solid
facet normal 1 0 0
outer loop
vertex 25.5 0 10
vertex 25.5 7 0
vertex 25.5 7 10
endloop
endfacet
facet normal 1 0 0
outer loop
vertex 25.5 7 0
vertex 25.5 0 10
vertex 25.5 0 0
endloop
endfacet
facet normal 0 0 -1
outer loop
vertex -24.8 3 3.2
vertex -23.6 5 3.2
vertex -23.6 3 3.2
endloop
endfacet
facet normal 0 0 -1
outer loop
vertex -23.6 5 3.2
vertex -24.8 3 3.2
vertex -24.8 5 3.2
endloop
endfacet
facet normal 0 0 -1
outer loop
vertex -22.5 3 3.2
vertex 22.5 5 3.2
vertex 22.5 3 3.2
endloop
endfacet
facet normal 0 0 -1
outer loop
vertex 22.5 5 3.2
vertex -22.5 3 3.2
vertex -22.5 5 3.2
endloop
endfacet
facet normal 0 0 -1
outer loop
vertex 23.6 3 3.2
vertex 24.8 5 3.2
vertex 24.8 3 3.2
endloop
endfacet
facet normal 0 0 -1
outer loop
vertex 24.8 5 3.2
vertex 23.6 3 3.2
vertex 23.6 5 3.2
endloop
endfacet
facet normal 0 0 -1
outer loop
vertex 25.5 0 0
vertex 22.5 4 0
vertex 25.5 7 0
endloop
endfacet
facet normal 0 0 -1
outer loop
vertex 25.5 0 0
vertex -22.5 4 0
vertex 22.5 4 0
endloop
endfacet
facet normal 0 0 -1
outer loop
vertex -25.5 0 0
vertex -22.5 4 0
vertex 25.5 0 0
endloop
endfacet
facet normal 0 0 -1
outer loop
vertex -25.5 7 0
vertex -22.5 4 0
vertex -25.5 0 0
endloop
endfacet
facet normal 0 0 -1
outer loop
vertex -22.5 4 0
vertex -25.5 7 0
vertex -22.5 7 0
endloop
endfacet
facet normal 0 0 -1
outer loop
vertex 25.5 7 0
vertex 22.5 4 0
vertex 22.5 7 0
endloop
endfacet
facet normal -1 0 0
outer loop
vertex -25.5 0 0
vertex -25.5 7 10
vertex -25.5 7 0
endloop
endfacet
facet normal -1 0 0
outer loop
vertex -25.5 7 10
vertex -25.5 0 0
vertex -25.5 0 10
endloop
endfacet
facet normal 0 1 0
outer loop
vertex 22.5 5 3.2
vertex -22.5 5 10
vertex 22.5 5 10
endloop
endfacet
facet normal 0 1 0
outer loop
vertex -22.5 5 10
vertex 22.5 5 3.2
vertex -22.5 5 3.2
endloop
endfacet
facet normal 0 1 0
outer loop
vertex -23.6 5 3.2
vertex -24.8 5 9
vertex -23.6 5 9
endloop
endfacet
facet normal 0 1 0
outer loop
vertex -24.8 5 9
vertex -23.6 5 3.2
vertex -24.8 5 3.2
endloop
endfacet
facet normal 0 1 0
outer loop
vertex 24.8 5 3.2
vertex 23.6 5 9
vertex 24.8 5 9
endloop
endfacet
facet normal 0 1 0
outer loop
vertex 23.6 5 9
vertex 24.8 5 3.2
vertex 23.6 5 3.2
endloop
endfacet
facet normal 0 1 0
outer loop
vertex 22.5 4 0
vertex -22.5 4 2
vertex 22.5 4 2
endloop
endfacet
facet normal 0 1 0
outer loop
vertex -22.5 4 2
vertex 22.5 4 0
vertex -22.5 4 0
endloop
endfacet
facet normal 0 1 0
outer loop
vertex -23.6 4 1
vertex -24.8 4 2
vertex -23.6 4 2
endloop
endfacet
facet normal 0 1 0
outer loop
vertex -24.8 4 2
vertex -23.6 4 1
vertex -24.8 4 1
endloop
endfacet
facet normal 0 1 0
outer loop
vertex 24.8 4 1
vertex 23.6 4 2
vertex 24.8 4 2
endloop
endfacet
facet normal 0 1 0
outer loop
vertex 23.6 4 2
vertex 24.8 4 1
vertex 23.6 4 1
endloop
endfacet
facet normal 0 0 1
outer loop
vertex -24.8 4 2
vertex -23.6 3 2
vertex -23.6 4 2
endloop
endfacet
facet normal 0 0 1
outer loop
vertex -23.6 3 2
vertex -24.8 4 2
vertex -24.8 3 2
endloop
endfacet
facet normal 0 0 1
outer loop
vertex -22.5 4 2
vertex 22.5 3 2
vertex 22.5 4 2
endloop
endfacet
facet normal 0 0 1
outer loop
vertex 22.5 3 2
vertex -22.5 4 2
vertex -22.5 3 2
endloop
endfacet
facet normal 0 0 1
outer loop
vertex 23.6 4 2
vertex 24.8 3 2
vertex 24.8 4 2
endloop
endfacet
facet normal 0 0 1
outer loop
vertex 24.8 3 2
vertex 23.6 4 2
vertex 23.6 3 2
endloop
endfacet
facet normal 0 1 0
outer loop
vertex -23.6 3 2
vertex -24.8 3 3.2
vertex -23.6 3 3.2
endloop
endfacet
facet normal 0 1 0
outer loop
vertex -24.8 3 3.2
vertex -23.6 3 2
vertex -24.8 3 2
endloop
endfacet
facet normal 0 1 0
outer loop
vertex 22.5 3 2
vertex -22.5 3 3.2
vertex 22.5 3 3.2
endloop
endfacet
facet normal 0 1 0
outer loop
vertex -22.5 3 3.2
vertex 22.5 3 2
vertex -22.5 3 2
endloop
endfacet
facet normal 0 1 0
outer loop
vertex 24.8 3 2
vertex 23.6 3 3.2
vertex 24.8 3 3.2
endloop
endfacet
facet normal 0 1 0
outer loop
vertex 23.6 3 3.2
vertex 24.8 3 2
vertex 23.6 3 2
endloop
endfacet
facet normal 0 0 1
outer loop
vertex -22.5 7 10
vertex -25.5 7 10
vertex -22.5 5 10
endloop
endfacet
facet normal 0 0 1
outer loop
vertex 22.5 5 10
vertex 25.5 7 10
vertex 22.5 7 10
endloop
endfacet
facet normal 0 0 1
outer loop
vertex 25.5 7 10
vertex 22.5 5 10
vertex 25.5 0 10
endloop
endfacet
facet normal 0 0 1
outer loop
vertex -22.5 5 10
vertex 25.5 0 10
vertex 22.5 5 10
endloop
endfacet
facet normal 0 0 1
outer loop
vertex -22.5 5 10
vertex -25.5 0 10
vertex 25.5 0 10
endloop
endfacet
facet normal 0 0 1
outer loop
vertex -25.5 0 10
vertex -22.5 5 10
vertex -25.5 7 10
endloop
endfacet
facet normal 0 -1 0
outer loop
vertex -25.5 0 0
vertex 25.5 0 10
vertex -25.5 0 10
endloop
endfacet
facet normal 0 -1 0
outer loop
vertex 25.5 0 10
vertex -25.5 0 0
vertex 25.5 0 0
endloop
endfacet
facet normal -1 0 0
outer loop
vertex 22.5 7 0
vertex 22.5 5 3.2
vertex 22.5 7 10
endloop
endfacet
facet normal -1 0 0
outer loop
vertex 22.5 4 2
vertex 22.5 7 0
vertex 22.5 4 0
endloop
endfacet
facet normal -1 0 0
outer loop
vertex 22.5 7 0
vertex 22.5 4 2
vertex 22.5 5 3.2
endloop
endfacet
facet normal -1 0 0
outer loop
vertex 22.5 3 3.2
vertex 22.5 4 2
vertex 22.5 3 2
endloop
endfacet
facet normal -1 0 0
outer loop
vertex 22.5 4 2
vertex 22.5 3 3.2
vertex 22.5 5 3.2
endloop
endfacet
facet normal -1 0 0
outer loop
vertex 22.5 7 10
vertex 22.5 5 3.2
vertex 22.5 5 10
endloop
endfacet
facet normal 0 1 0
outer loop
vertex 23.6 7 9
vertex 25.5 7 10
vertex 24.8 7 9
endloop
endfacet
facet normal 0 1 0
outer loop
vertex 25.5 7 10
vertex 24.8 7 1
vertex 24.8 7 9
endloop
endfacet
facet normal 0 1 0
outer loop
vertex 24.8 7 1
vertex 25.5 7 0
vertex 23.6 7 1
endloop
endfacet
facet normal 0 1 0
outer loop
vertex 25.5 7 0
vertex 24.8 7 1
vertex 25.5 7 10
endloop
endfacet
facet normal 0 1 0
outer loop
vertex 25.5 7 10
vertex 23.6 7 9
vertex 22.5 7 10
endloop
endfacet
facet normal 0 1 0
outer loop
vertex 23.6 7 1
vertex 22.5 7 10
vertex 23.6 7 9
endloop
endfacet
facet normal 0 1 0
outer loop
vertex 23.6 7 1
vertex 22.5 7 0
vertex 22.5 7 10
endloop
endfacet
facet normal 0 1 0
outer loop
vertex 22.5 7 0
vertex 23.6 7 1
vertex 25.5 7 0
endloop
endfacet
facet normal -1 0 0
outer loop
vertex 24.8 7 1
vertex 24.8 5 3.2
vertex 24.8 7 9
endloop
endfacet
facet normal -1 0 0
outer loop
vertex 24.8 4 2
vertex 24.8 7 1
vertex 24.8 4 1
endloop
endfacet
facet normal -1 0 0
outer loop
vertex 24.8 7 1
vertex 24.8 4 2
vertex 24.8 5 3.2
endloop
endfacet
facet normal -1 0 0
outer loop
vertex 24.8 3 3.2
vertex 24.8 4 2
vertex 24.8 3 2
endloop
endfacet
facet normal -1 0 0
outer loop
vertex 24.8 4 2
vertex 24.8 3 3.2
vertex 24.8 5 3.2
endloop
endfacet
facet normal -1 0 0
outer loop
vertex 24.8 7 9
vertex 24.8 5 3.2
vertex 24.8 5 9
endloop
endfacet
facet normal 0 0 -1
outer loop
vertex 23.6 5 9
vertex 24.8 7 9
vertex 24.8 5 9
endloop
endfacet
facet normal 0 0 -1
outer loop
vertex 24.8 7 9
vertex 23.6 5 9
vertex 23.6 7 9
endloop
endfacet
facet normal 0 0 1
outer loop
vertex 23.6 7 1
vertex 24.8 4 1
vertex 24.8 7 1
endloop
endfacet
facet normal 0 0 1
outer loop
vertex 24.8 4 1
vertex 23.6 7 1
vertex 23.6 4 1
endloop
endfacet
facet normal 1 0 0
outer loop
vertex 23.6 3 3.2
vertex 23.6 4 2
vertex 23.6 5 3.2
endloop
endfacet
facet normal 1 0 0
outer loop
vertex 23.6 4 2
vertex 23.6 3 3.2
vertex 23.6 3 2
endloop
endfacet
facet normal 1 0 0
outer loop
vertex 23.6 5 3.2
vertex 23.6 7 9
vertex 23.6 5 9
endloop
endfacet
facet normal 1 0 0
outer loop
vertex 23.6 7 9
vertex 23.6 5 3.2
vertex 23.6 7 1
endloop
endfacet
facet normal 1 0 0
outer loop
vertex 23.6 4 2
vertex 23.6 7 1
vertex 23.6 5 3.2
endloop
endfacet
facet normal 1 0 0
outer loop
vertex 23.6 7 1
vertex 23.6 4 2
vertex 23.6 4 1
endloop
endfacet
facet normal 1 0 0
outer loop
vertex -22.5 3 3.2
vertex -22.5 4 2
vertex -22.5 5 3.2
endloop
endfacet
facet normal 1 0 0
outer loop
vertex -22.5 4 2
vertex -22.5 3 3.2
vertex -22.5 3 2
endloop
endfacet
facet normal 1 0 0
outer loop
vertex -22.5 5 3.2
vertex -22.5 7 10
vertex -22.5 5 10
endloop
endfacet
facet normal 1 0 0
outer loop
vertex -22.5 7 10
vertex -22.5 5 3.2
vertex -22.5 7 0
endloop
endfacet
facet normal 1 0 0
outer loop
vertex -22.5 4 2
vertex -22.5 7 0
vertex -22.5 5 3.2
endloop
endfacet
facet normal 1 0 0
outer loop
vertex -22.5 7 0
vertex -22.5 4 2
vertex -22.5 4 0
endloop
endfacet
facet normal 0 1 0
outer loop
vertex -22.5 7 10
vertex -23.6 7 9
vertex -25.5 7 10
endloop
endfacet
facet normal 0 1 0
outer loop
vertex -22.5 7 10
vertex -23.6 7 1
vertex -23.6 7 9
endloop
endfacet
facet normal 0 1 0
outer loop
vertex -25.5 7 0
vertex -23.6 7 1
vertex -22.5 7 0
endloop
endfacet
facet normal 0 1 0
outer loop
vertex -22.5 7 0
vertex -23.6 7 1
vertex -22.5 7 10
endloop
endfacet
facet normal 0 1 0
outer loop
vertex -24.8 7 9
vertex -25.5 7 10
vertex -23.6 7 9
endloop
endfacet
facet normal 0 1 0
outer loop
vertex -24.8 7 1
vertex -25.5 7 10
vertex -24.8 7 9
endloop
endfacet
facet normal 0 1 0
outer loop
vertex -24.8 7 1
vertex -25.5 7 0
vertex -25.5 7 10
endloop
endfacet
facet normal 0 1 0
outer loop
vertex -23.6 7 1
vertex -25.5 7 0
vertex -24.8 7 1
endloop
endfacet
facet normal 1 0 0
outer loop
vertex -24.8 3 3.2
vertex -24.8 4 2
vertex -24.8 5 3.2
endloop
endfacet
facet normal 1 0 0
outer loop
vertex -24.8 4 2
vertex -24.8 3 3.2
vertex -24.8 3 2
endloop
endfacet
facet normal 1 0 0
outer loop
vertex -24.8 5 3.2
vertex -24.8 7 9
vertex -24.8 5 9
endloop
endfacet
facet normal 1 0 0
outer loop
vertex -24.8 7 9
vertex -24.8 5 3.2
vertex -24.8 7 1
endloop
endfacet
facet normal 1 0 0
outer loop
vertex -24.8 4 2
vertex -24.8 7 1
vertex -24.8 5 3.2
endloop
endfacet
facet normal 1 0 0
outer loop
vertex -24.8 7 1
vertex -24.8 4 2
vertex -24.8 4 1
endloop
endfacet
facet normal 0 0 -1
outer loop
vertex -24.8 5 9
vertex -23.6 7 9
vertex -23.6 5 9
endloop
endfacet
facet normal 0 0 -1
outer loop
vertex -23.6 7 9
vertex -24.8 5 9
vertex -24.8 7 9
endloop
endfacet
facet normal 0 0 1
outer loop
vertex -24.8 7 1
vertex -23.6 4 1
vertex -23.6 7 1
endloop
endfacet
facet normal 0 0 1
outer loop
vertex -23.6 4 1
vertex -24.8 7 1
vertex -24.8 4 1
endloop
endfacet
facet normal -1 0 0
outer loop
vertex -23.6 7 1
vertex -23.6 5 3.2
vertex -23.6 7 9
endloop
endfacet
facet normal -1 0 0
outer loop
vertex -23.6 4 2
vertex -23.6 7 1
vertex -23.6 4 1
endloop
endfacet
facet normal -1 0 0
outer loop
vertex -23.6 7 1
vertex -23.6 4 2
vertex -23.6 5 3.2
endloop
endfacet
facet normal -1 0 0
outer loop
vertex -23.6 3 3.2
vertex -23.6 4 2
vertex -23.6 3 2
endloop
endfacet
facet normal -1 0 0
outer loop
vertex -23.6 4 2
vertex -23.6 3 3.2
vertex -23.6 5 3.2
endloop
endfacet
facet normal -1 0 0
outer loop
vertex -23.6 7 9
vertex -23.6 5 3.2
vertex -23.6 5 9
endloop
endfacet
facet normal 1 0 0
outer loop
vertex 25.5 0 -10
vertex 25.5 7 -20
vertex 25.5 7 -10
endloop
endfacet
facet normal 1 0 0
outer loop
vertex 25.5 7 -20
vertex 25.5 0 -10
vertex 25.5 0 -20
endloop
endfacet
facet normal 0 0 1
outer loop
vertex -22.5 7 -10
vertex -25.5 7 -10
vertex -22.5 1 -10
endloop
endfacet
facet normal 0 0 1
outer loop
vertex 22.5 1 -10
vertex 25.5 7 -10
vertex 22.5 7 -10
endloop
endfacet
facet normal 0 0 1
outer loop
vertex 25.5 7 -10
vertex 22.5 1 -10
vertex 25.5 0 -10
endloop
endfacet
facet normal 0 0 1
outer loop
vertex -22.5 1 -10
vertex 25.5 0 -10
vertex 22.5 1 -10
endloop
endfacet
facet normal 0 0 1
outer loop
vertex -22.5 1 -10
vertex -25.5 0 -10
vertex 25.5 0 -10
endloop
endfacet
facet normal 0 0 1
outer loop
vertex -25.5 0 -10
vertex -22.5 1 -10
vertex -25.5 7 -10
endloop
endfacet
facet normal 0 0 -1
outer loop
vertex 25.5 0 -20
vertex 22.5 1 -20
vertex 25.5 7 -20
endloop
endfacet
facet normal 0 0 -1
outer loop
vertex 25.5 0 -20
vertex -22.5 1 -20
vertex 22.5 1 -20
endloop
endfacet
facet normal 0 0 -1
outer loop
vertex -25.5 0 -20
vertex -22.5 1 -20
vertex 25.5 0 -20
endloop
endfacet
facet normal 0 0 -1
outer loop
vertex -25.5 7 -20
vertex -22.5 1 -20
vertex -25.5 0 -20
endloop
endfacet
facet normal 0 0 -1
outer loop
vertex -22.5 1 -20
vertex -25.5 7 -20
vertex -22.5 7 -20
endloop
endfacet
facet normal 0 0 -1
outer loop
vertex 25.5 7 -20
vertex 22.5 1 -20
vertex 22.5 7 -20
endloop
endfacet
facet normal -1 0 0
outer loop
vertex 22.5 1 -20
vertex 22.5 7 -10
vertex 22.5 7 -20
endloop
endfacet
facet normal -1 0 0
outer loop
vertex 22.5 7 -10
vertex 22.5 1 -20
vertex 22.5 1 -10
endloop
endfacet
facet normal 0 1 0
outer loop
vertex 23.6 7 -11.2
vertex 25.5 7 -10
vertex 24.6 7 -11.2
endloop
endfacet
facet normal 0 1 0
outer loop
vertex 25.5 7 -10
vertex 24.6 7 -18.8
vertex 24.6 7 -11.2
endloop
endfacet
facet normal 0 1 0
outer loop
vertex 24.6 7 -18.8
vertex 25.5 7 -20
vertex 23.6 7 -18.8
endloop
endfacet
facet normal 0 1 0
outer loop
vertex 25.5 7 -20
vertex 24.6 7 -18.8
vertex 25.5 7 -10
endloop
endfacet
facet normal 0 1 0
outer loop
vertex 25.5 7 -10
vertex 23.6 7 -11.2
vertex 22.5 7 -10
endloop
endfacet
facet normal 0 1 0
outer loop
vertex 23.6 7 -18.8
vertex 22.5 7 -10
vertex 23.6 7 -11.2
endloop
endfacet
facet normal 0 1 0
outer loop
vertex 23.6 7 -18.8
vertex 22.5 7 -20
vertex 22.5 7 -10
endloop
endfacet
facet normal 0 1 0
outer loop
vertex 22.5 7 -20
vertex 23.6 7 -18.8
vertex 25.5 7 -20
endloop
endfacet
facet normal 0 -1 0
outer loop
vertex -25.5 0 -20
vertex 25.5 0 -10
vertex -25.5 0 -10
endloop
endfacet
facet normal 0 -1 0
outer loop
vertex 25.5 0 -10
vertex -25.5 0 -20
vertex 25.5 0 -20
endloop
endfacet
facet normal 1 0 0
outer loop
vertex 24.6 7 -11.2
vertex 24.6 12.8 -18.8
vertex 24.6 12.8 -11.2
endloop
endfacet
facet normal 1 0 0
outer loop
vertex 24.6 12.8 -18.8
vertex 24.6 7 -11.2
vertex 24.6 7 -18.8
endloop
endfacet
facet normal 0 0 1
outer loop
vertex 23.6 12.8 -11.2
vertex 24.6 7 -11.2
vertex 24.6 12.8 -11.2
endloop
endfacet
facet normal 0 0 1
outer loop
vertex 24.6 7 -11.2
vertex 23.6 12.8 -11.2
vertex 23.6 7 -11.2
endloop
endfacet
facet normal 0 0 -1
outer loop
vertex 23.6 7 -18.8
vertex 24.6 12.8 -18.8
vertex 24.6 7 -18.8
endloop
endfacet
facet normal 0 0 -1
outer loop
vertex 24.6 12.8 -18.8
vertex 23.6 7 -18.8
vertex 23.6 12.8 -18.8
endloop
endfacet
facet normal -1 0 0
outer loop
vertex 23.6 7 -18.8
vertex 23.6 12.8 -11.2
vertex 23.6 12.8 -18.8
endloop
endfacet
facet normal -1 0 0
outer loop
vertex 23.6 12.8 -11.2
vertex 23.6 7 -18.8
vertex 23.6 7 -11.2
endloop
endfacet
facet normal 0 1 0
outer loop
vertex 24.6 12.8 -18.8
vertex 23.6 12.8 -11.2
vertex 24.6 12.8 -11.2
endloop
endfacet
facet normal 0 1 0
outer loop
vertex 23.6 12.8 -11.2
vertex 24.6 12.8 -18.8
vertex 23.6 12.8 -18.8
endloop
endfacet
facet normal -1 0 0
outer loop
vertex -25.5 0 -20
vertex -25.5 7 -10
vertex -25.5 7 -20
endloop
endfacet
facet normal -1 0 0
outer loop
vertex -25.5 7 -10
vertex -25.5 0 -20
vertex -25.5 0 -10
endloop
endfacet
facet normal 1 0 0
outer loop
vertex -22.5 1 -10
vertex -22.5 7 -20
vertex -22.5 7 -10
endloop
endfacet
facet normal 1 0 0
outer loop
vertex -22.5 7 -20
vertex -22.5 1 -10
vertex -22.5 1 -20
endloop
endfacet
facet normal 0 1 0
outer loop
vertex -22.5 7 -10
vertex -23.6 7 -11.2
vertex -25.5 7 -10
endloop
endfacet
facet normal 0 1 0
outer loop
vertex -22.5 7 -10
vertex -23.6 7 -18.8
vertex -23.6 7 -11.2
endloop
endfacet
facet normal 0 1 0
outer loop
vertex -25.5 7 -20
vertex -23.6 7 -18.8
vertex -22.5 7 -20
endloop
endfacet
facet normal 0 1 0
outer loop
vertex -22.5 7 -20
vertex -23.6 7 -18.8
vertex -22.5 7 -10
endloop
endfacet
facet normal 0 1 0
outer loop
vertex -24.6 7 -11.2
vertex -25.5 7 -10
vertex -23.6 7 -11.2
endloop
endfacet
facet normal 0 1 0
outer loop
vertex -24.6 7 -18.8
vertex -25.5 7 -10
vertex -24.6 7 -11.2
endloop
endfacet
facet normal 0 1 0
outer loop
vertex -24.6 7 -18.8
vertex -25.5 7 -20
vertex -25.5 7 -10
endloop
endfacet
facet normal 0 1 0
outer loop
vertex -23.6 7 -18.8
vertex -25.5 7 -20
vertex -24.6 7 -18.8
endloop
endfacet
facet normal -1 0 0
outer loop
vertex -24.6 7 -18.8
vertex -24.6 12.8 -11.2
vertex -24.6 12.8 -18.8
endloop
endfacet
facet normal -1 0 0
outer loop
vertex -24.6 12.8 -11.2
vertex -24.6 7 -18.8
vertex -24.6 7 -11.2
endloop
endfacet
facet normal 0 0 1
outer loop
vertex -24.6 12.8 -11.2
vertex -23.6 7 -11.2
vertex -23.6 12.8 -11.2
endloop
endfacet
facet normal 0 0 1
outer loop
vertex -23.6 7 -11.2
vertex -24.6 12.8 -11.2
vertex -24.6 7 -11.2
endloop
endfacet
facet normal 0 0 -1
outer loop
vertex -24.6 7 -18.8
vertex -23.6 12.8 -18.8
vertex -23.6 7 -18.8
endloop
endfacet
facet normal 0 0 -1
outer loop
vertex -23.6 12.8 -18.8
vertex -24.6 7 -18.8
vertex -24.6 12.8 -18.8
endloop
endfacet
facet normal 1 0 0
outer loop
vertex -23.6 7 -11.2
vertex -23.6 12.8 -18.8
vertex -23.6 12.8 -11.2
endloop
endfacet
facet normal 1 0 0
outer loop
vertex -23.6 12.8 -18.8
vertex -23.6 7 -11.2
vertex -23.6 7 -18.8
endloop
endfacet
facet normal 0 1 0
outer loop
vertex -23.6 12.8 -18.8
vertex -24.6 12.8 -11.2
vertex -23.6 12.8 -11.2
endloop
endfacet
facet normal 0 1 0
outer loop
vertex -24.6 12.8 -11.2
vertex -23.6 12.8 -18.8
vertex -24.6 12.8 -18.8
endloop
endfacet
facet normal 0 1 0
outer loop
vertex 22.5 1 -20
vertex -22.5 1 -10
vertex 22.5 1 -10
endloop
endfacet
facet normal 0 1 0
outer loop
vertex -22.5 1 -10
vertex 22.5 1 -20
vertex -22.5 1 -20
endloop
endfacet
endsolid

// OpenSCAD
// we're not describing SATA power plugs,
// but rather the three EVGA plugs that connect to
// our PSU's three SATA ports.


give = 0.2; // gaps on fittings

evgawidth = 15; // studs only extend the height
evgaheight = 9; // does NOT include studs

// there are two of these 3x1x1 studs, one on either
// side of the EVGA connector.
evgacstudwidth = 3;
evgastudheight = 1;
evgastuddepth = 1 + give;

// then there's a center clip which plugs in. it's
// only about 2mm in front of the studs.
evgastudgap = 2;
// 4mm covers the top of the stud through the
// bottom of the center spoke. we need be at least
// this tall to wedge against both
evgastudcenterheight = 4;

plugs = 3;

// total geometry of the EVGA connector
totalheight = evgastudcenterheight + evgaheight + evgastudheight;
totalwidth = 3 * evgawidth;

extrawidth = 3; // per side

depth = 10; // random for now

w = totalwidth + extrawidth * 2;
// the bottom, where the plugs nestle
translate([-w / 2, 0, 0]){
    difference(){
        cube([w, 5, depth]);
        union(){
            // lop off the top until we clear the plug (3 deep)
            translate([0, 4, 0]){
                cube([w, 1, evgastudgap + evgastuddepth]);
            }
            // cut out hole for stud
            translate([0, 3, evgastudgap]){
                cube([w, 1, evgastuddepth]);
            }
        }
    }
}

// side walls (each extrawidth thick, with a hole)
module sidewall(){
    translate([w / 2 - extrawidth, 0, 0]){
        difference(){
            cube([extrawidth, totalheight / 2, depth]);
            translate([1 + give / 2, 1, 1]){
                cube([1 + give, totalheight / 2 - 1, depth - 2]);
            }
        }
    }
}
sidewall();
mirror([1, 0, 0]){
    sidewall();
}

// now our top piece

// top sides are solid with a plug
module topsidewall(){
    translate([w / 2 - extrawidth, 0, 0]){
        cube([extrawidth, totalheight / 2, depth]);
        translate([1 + give / 2, totalheight / 2, 1 + give]){
            cube([1, totalheight / 2 - 1 - give, depth - 2 - give * 2]);
        }
    }
}

translate([0, 0, -20]){
    translate([-w / 2, 0, 0]){
        cube([w, 1, depth]);
    }
    topsidewall();
    mirror([1, 0, 0]){
        topsidewall();
    }
}
